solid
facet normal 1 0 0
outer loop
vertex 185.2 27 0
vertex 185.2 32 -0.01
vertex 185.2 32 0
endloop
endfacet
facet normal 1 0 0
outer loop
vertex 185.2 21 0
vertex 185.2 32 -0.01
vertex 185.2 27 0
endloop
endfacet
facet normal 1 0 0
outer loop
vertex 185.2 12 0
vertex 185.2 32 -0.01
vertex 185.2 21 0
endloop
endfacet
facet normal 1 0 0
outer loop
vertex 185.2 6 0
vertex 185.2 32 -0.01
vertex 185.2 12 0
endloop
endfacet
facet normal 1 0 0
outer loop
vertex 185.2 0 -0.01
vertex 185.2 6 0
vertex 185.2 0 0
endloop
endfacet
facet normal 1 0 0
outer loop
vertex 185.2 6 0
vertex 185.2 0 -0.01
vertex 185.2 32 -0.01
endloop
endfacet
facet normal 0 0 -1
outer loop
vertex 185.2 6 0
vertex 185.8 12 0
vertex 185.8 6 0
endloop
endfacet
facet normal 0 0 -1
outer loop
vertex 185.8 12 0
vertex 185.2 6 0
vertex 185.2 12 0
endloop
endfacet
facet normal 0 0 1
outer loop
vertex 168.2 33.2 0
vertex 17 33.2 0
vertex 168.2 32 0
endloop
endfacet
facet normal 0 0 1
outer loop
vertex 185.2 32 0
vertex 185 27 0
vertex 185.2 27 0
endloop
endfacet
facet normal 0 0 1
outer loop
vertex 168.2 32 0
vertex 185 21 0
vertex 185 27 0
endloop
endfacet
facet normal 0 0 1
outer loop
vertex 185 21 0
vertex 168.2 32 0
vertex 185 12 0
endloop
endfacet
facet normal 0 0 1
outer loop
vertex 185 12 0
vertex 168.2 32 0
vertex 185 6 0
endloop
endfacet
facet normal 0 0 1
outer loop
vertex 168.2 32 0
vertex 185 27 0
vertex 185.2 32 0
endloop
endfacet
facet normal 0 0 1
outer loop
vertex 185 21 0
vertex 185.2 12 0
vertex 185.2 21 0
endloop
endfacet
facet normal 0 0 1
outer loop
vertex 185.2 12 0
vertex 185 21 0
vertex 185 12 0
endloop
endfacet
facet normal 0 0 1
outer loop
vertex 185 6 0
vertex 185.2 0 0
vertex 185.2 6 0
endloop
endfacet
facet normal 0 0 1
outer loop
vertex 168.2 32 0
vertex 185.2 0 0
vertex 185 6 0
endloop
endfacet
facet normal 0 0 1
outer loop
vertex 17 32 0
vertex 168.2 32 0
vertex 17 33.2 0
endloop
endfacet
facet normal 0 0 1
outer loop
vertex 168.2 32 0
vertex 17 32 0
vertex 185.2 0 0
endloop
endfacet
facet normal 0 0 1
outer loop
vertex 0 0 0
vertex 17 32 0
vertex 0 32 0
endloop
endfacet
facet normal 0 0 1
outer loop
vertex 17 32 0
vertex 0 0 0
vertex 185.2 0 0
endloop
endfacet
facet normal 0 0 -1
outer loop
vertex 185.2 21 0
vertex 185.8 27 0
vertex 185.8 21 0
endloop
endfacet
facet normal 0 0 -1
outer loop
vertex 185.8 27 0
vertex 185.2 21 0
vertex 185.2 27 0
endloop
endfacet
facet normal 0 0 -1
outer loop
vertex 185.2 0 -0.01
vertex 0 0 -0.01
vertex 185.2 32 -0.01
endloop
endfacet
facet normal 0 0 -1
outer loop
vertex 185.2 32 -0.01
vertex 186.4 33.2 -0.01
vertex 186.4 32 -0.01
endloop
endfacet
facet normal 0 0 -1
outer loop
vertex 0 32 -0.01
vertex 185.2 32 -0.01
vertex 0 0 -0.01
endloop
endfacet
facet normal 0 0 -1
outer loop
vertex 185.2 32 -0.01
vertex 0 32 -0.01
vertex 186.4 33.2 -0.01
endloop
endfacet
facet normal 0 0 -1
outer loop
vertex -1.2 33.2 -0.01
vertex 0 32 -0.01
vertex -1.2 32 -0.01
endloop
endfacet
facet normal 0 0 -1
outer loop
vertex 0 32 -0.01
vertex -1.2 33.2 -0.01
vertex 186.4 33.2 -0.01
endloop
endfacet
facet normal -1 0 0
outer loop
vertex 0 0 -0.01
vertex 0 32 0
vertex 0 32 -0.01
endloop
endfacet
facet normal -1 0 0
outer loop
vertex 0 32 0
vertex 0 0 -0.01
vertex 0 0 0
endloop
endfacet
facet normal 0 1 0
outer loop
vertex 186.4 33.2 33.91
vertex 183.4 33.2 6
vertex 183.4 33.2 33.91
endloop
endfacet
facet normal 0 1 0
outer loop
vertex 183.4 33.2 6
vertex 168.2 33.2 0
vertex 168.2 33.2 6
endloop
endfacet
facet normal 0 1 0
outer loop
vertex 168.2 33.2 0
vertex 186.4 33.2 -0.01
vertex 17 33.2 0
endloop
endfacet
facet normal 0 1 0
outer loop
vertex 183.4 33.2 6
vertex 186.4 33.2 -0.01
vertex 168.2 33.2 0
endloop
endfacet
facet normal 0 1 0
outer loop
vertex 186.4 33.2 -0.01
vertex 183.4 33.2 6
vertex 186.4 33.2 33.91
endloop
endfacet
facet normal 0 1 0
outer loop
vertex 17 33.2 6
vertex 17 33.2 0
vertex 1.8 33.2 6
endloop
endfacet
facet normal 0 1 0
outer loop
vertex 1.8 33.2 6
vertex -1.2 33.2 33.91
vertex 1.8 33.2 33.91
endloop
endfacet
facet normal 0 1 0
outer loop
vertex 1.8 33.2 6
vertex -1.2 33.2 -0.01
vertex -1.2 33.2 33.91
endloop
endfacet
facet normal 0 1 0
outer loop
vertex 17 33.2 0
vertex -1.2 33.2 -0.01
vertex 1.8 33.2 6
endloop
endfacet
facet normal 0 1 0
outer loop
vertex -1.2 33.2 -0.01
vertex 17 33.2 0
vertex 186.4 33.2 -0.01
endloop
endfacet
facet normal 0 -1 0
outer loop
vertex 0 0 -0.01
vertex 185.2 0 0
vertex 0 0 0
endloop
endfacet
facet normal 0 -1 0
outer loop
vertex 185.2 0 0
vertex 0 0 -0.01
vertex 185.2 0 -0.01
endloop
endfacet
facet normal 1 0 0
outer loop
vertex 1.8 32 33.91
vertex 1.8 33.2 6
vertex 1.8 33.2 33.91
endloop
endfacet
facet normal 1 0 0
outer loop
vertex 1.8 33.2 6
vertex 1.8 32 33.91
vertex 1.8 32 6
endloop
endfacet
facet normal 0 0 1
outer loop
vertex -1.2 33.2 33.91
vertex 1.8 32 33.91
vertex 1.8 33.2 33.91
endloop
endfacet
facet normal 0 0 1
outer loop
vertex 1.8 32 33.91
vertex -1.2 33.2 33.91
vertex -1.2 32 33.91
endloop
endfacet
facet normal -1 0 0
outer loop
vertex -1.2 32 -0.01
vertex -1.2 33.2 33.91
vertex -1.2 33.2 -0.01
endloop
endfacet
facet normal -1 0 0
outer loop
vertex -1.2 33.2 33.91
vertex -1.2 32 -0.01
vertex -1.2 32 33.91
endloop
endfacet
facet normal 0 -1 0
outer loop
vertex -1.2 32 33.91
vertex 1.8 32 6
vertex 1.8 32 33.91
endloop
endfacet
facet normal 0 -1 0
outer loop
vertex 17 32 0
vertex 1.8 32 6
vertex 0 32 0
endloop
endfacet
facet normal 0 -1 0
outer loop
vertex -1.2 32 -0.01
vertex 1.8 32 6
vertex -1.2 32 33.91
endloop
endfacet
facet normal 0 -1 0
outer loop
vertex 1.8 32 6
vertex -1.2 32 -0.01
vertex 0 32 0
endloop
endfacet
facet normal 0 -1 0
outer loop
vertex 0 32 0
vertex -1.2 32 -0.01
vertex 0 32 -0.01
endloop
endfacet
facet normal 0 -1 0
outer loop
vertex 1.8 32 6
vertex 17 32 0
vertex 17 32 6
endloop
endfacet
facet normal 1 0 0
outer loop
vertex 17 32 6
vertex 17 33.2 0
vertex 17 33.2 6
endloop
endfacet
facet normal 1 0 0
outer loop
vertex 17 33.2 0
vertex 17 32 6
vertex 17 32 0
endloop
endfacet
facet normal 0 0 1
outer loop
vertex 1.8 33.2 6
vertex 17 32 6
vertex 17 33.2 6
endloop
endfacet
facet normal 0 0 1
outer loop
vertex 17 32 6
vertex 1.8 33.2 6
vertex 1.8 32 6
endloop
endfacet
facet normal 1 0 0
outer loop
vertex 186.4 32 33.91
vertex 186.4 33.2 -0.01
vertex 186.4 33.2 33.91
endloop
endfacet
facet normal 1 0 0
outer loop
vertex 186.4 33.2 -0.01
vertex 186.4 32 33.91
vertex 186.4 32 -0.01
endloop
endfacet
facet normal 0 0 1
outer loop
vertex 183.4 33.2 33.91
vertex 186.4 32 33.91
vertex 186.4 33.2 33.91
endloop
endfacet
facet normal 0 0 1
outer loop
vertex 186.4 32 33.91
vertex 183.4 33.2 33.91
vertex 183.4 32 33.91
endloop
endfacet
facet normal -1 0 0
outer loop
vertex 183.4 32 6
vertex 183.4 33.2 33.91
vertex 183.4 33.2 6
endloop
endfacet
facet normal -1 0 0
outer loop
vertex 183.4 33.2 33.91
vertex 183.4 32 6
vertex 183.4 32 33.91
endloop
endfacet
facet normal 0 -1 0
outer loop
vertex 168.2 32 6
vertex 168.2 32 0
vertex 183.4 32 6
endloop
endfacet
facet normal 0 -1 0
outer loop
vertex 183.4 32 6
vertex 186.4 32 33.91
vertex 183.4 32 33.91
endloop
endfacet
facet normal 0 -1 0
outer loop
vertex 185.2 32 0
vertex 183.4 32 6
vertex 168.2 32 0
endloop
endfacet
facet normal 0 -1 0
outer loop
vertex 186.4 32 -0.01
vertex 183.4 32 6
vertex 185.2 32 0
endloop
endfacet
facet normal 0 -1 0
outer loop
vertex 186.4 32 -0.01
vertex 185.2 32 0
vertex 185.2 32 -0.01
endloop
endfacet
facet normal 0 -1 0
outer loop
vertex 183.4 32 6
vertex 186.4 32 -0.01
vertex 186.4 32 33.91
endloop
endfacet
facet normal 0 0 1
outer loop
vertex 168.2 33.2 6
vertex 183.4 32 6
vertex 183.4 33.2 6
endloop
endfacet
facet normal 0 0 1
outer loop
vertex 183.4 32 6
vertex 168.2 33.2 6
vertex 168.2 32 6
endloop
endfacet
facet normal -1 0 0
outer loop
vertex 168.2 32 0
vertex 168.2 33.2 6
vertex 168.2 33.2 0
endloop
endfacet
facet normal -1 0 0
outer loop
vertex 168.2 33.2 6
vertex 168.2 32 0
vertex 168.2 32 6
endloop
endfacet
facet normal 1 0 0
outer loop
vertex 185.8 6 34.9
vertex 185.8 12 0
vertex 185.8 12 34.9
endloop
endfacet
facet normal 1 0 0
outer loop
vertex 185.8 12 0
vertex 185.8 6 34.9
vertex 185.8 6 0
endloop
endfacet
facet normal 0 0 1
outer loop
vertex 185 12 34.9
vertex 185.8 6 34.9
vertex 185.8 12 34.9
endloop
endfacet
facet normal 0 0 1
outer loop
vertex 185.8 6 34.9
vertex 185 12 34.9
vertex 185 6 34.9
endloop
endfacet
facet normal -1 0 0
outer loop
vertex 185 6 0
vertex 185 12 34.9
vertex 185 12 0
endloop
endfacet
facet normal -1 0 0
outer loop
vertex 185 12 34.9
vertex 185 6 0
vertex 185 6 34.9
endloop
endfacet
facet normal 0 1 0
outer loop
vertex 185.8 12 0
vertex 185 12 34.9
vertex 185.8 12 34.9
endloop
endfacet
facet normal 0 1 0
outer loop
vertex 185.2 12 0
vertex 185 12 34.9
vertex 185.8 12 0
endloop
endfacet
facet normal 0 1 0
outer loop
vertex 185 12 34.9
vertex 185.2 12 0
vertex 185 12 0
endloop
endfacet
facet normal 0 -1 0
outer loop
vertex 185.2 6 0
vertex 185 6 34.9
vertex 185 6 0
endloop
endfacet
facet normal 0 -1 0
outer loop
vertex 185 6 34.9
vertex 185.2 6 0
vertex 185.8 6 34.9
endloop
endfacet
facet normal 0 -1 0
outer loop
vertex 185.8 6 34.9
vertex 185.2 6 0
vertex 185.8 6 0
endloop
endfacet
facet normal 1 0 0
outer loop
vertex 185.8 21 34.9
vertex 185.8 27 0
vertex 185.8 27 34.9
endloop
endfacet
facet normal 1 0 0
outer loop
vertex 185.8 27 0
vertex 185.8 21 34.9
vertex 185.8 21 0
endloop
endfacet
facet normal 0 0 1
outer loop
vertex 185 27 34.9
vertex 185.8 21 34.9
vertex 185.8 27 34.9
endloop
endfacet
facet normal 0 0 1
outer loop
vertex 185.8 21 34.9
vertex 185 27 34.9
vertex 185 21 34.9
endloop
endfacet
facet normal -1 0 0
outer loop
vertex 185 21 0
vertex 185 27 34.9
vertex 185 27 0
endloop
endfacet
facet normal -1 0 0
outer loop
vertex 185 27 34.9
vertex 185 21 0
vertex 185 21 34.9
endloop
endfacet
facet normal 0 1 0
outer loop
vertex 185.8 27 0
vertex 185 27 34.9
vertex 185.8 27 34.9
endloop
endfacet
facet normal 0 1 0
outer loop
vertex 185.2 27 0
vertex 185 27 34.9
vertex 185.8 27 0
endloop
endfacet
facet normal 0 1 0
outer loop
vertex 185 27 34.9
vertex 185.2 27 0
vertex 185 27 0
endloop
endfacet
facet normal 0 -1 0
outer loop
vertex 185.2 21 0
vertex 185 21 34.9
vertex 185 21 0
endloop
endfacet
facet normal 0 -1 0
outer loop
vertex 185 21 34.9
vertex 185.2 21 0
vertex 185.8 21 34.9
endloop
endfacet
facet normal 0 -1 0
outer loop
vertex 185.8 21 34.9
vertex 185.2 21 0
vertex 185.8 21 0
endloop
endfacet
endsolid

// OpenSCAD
// file: ../Base/Rotation.scad
// Fischertechnik Box Foundation
// Geometry Helpers Rotation

include <PlacementOptions.scad>

// getRotatedSpace(space, rotation=NoRotation)
// Rotates the space dependent on the specified rotation

function getRotatedSpace(space, rotation=NoRotation) = [
    (rotation == Rotate90 || rotation == Rotate270) ? space.y : space.x,
    (rotation == Rotate90 || rotation == Rotate270) ? space.x : space.y
];

// Rotates the given space around the fixed left lower corner
// space = the space the children needs as width/depth list [width,depth]
// rotation = 0 Rotate0 degrees, 1 Rotate90 degrees, 2 Rotate180 degrees, 3 Rotate270 degrees (equivalent to -90)

module RotateFix(space, rotation=Rotate0) {
    dy = (rotation == Rotate0 || rotation == Rotate270) ? 0 :
        (rotation == Rotate90) ? space.x :
        space.y;
    dx = (rotation < Rotate180) ? 0 :
        (rotation == Rotate180) ? space.x :
        space.y;
    
    translate([dx, dy, 0])
        rotate([0, 0, rotations[rotation]])
            children();
}
// file: ../Base/Alignment.scad
// Fischertechnik Box Foundation
// Geometry Helpers Alignment

include <PlacementOptions.scad>

// getAlignedX(elementWidth, spaceWidth, align=AlignRight, offset=0)
// Gets the aligned X offset of an element with the given
// width in the given space.
// elementWidth = The width of the element to positon
// spaceWidth = The space where the element should be aligned
// align = 0 AlignLeft, 1 AlignCenter, 2 AlignRight
// offset = an optional offset from the aligned position. When
// aligned left or centered, then positive values are in X direction.
// When aligned right then positive values are in negative X direction.

function getAlignedX(elementWidth, spaceWidth, align=AlignRight, offset=0) =
    (align == AlignLeft) ?
        offset :
        ((align == AlignCenter) ?
        (spaceWidth - elementWidth)/2 + offset :
        spaceWidth - offset - elementWidth);

// getAlignedY(elementDepth, spaceDepth, align=AlignTop, offset=0)
// Gets the aligned Y offset of an element with the given
// depth in the given space.
// elementDepth = The depth of the element to positon
// spaceDepth = The space where the element should be aligned
// align = 0 AlignBottom, 1 AlignCenter, 2 AlignTop
// offset = an optional offset from the aligned position. When
// aligned bottom or centered, then positive values are in Y direction.
// When aligned top then positive values are in negative Y direction.

function getAlignedY(elementDepth, spaceDepth, align=AlignTop, offset=0) =
    (align == AlignBottom) ?
        offset :
        ((align == AlignCenter) ?
        (spaceDepth - elementDepth)/2 + offset :
        spaceDepth - offset - elementDepth);
// file: ../Base/PlacementOptions.scad
// Fischertechnik Box Foundation
// Placement Options

// Alignment
NoAlign = 0;
AlignLeft = 1;
AlignBottom = 2;
AlignCenter = 3;
AlignRight = 4;
AlignTop = 5;

// Element rotation degree steps
rotations = [0, -90, -180, -270];

// Rotation
NoRotation = 0;
Rotate0 = 0;
Rotate90 = 1;
Rotate180 = 2;
Rotate270 = 3;

// Docking (seen from above)
NoDock = -1;
DockLeft = 0;
DockTop = 1;
DockRight = 2;
DockCorner = 2;
DockBottom = 3;

// Web corners
LowerLeft = 0;
UpperLeft = 1;
UpperRight = 2;
LowerRight = 3;

// Web position relative to corner
LeftOfCorner = 0;
RightOfCorner = 1;
// file: ../Base/Boxes.scad
// Fischertechnik Box Foundation
// Pre-designed Boxes

use <Constants.scad>

include <PlacementOptions.scad>

box190Width = 190;
box190Depth = 130;
box130Width = 130;
box130Depth = 95;
boxUsageHeight = 33.9;
boxWallThickness = 2.4;
boxBaseThickness = 1.0;
boxWebWidth = 3.0;

// getBoxWallThickness()
// Gets the wall thickness of a Fischertechnik Box

function getBoxWallThickness() = boxWallThickness;

// Gets the usable height of a fischertechnik box
function getBoxUsageHeight() = boxUsageHeight;

// Gets the thickness of the Fischertechnik box base.
function getBoxBaseThickness() = boxBaseThickness;

// Gets the width of a box web
function getBoxWebWidth() = boxWebWidth;

// Gets the usable inner space of a Box 190 as an x/y-list
function getBox190Space() = [
    box190Width - 2*getBoxWallThickness(), 
    box190Depth - 2*getBoxWallThickness() ];

// Imports the Fischertechnik empty box 130x190 mm and places it at position 0,0
// 190x130 are the outer sizes, the inner space is slightly smaller. Use getBox190Space() to get the inner sizes.
// This module needs the STL file "Fischertechnik Box 130x190.stl" in the library path.
// The box is positioned that the usable inner space is at the 0,0,0 position. The

module Box190() {
    translate([-getBoxWallThickness(),-getBoxWallThickness(),-getBoxBaseThickness()])
        import("Fischertechnik Box 130x190.stl", convexity=3);
}

// Gets the usable inner space of a Box 130 as an x/y-list
function getBox130Space() = [
    box130Width - 2*getBoxWallThickness(), 
    box130Depth - 2*getBoxWallThickness() ];

// Imports the Fischertechnik empty box 95x130 mm and places it at position 0,0
// 190x130 are the outer sizes, the inner space is slightly smaller. Use getBox190Space() to get the inner sizes.
// This module needs the STL file "Fischertechnik Box 95x130.stl" in the library path.
// The box is positioned that the usable inner space is at the 0,0,0 position. The

module Box130() {
    translate([-getBoxWallThickness(),-getBoxWallThickness(),-getBoxBaseThickness()])
        import("Fischertechnik Box 95x130.stl", convexity=3);
}

// Creates a web at the specified box walls
// corner 0 = LowerLeft, 1 = UpperLeft, 2 = UpperRight, 3 = LowerRight
// side 0 = LeftOfCorner, 1 = RightOfCorner
// distance = Distance in mm from the corner
// box = inner width and depth of the box (default: Box 190)
// webWidth = length of the web (default is 3 mms)
// webThickness = thickness of the web (default is 1 mm)

module BoxWeb(corner, side, distance, box=getBox190Space(), webWidth=getBoxWebWidth(), webThickness=1.0) {
    sink = getBoxWallThickness()/2;

    width = (corner % 2 == 0) ? 
            (side == LeftOfCorner ? webWidth : webThickness) :
            (side == LeftOfCorner ? webThickness : webWidth);

    depth = (corner % 2 == 0) ? 
            (side == RightOfCorner ? webWidth : webThickness) :
            (side == RightOfCorner ? webThickness : webWidth);
    
    xDiff = corner == LowerLeft ? 
                (side == LeftOfCorner ? -sink : distance) :
            (corner == UpperLeft ?                
                (side == LeftOfCorner ? distance : -sink) :
            (corner == UpperRight ?
                (side == LeftOfCorner ? box.x-webWidth+sink : box.x-distance-webThickness) :
                (side == LeftOfCorner ? box.x-distance-webThickness: box.x-webWidth+sink)));

    yDiff = corner == LowerLeft ? 
                (side == RightOfCorner ? -sink : distance) :
            (corner == UpperLeft ?
                (side == RightOfCorner ? box.y-distance : box.y-webWidth+sink) :
            (corner == UpperRight ?
                (side == RightOfCorner ? box.y-webWidth+sink : box.y-distance) :
                (side == RightOfCorner ? distance : -sink)));
    
    translate([xDiff, yDiff, -getExcess()])
        cube([width, depth, boxUsageHeight + 2*getExcess()]);
}
// file: ../Base/Placement.scad
// Fischertechnik Box Foundation
// Geometry Helpers Placement

use <Constants.scad>
use <Alignment.scad>
use <Rotation.scad>
use <Boxes.scad>

include <PlacementOptions.scad>

// Place(x=0, y=0, elementSpace=[0,0], alignX=AlignLeft, alignY=AlignBottom, rotation=Rotate0, boxSpace=getBox190Space())
// Places the child at the specified position
// y = Y-Position. This is a relative position when an X aligment is specified.
// x = X-Position. This is a relative position when an Y aligment is specified.
// elementSpace = space of the element to be placed [x,y]
// alignX = -1=NoAlign, 0 AlignLeft, 1 AlignCenter, 3 AlignRight (elementSpace and boxSpace required!)
// alignY = -1=NoAlign, 2 AlignBottom, 1 AlignCenter, 4 AlignTop (elementSpace and boxSpace required!)
// rotation = 0 Rotate0 0 degrees, 1 Rotate90 90 degrees, 
// 2 Rotate180 180 degrees, 3 Rotate270 270 degrees (equivalent to -90)
// boxSpace = Inner space of the box where the placement occurs [x,y] - default is Box 190x130 inner space

module Place(x=0, y=0, elementSpace=[0,0], 
  alignX=AlignLeft, alignY=AlignBottom, 
  rotation=NoRotation, boxSpace=getBox190Space()) {

    module Position(x, y, space, rotation=Rotate0) {
        translate([x, y, 0])
            RotateFix(space, rotation)
                children();
    }

    space = getRotatedSpace(elementSpace, rotation);
    alignedX = getAlignedX(space.x, boxSpace.x, alignX, x);
    alignedY = getAlignedY(space.y, boxSpace.y, alignY, y);
    Position(alignedX, alignedY, elementSpace, rotation)
        children();
}

// Center(space=getBox130Space(), elementSpace=[0,0])
// space = Space where the children is centered. For cylinder use centered=true and no elementSpace.
// elementSpace = space of the element to be centered [x,y]

module Center(space=getBox190Space(), elementSpace=[0,0]) {
    translate([(space.x - elementSpace.x) / 2, (space.y - elementSpace.y) / 2])
        children(0);
}

// CenterHorizontal(width=0, y=0, offset=0, space=getBox130Space())
// space = Space where the children is centered. For cylinder use centered=true and no elementSpace.
// elementSpace = space of the element to be centered [x,y]

module CenterHorizontal(width=0, y=0, offset=0, space=getBox190Space()) {
    translate([(space.x - width) / 2 + offset, y])
        children(0);
}

// CenterVertical(depth=0, x=0, offset=0, space=getBox130Space())
// space = Space where the children is centered. For cylinder use centered=true and no elementSpace.
// elementSpace = space of the element to be centered [x,y]

module CenterVertical(depth=0, x=0, offset=0, space=getBox190Space()) {
    translate([x, (space.y - depth) / 2 + offset])
        children(0);
}
// file: ../Base/Constants.scad
// Fischertechnik Box Foundation
// Constants

// Constant values necessary for multiple elements

// Base constants
dividerThickness = 1.2;
excess = 0.01;
fragments = 90;
tolerance = 0.8;

// Gets the thickness of a divider 
function getDividerThickness() = dividerThickness;

// Gets the excess that is used to merge walls into each other
function getExcess() = excess;

// Gets amount of fragments of a cylinder
function getFragments() = fragments;

// Gets the inner tolerance of a frame to each side
function getTolerance() = tolerance;


// Fischertechnik specific constants
axisDiameter = 4;
axisBottomDiameter = axisDiameter + 1;
standardEdgeDistance = 2.5;
standardWebDistance = 11.5;
standardCornerLength = 15;
tubeWallFactor = 0.8;

// Gets axis diameter
function getAxisDiameter() = axisDiameter;

// Gets axis bottom diameter for thicker part at the bottom
function getAxisBottomDiameter() = axisBottomDiameter;

// gets the standard distance to the wall of the box for dockable frames with webs
function getStandardEdgeDistance() = standardEdgeDistance;

// gets the standard distance of each web to the corner of the dockable frame
function getStandardWebDistance() = standardWebDistance;

// gets the standard length of the corner walls of a dockable frame
function getStandardCornerLength() = standardCornerLength;

// gets the wall thickness of a tube.
function getTubeWallThickness() = tubeWallFactor * getDividerThickness();
// main file
use <../Base/Constants.scad>
use <../Base/Placement.scad>
use <../Base/Boxes.scad>
use <../ModelBase/Simple.scad>

include <../Base/PlacementOptions.scad>

width = getBox190Space().x;
height = 30;
depth = 32;

// Gets the space of a hoder for the 70's battery set (180x30x30)

function getHolderBatterySetSpace() = [width, depth + getDividerThickness(), height];

// Holder for the 70's battery set (180x30x30)
// Must be docked to the bottom or rotated by 180 degrees at the top of a box 190.

module HolderBatterySet() {
    
    webVolume = [getBoxWebWidth(), getDividerThickness(), getBoxUsageHeight()];
    webWallVolume = [17, getDividerThickness(), 6];
    
    Space(getHolderBatterySetSpace());

    BoxWeb(LowerLeft, LeftOfCorner, depth, webThickness=getDividerThickness());
    Place(0,depth, elementSpace=webWallVolume, alignX=AlignLeft)
        Wall(webWallVolume);
    
    BoxWeb(LowerRight, RightOfCorner, depth, webThickness=getDividerThickness());
    Place(0,depth, elementSpace=webWallVolume, alignX=AlignRight)
        Wall(webWallVolume);
}

// Cut off for the Box 190 when placing a HolderBattery for the two right connectors
// Use difference() with the Boy190 and rotate and align top if aligned to the top

module HolderBatterySetCutoffs() {
    cutOffWidth = 0.8;
    cutOffDepth = 6.0;
    cutOffY = 7.0;
    cutOffDistance = 9.0;
    cutOffVolume = [cutOffWidth, cutOffDepth, getBoxUsageHeight()+1];
    Place(-0.6, cutOffDepth, elementSpace=cutOffVolume, alignX=AlignRight) {
        cube(cutOffVolume);
        translate([0, cutOffDistance + cutOffDepth])
            cube(cutOffVolume);
    }
}

// Test
color("lightgray")
HolderBatterySet();
// Difference to Box190:
HolderBatterySetCutoffs();
